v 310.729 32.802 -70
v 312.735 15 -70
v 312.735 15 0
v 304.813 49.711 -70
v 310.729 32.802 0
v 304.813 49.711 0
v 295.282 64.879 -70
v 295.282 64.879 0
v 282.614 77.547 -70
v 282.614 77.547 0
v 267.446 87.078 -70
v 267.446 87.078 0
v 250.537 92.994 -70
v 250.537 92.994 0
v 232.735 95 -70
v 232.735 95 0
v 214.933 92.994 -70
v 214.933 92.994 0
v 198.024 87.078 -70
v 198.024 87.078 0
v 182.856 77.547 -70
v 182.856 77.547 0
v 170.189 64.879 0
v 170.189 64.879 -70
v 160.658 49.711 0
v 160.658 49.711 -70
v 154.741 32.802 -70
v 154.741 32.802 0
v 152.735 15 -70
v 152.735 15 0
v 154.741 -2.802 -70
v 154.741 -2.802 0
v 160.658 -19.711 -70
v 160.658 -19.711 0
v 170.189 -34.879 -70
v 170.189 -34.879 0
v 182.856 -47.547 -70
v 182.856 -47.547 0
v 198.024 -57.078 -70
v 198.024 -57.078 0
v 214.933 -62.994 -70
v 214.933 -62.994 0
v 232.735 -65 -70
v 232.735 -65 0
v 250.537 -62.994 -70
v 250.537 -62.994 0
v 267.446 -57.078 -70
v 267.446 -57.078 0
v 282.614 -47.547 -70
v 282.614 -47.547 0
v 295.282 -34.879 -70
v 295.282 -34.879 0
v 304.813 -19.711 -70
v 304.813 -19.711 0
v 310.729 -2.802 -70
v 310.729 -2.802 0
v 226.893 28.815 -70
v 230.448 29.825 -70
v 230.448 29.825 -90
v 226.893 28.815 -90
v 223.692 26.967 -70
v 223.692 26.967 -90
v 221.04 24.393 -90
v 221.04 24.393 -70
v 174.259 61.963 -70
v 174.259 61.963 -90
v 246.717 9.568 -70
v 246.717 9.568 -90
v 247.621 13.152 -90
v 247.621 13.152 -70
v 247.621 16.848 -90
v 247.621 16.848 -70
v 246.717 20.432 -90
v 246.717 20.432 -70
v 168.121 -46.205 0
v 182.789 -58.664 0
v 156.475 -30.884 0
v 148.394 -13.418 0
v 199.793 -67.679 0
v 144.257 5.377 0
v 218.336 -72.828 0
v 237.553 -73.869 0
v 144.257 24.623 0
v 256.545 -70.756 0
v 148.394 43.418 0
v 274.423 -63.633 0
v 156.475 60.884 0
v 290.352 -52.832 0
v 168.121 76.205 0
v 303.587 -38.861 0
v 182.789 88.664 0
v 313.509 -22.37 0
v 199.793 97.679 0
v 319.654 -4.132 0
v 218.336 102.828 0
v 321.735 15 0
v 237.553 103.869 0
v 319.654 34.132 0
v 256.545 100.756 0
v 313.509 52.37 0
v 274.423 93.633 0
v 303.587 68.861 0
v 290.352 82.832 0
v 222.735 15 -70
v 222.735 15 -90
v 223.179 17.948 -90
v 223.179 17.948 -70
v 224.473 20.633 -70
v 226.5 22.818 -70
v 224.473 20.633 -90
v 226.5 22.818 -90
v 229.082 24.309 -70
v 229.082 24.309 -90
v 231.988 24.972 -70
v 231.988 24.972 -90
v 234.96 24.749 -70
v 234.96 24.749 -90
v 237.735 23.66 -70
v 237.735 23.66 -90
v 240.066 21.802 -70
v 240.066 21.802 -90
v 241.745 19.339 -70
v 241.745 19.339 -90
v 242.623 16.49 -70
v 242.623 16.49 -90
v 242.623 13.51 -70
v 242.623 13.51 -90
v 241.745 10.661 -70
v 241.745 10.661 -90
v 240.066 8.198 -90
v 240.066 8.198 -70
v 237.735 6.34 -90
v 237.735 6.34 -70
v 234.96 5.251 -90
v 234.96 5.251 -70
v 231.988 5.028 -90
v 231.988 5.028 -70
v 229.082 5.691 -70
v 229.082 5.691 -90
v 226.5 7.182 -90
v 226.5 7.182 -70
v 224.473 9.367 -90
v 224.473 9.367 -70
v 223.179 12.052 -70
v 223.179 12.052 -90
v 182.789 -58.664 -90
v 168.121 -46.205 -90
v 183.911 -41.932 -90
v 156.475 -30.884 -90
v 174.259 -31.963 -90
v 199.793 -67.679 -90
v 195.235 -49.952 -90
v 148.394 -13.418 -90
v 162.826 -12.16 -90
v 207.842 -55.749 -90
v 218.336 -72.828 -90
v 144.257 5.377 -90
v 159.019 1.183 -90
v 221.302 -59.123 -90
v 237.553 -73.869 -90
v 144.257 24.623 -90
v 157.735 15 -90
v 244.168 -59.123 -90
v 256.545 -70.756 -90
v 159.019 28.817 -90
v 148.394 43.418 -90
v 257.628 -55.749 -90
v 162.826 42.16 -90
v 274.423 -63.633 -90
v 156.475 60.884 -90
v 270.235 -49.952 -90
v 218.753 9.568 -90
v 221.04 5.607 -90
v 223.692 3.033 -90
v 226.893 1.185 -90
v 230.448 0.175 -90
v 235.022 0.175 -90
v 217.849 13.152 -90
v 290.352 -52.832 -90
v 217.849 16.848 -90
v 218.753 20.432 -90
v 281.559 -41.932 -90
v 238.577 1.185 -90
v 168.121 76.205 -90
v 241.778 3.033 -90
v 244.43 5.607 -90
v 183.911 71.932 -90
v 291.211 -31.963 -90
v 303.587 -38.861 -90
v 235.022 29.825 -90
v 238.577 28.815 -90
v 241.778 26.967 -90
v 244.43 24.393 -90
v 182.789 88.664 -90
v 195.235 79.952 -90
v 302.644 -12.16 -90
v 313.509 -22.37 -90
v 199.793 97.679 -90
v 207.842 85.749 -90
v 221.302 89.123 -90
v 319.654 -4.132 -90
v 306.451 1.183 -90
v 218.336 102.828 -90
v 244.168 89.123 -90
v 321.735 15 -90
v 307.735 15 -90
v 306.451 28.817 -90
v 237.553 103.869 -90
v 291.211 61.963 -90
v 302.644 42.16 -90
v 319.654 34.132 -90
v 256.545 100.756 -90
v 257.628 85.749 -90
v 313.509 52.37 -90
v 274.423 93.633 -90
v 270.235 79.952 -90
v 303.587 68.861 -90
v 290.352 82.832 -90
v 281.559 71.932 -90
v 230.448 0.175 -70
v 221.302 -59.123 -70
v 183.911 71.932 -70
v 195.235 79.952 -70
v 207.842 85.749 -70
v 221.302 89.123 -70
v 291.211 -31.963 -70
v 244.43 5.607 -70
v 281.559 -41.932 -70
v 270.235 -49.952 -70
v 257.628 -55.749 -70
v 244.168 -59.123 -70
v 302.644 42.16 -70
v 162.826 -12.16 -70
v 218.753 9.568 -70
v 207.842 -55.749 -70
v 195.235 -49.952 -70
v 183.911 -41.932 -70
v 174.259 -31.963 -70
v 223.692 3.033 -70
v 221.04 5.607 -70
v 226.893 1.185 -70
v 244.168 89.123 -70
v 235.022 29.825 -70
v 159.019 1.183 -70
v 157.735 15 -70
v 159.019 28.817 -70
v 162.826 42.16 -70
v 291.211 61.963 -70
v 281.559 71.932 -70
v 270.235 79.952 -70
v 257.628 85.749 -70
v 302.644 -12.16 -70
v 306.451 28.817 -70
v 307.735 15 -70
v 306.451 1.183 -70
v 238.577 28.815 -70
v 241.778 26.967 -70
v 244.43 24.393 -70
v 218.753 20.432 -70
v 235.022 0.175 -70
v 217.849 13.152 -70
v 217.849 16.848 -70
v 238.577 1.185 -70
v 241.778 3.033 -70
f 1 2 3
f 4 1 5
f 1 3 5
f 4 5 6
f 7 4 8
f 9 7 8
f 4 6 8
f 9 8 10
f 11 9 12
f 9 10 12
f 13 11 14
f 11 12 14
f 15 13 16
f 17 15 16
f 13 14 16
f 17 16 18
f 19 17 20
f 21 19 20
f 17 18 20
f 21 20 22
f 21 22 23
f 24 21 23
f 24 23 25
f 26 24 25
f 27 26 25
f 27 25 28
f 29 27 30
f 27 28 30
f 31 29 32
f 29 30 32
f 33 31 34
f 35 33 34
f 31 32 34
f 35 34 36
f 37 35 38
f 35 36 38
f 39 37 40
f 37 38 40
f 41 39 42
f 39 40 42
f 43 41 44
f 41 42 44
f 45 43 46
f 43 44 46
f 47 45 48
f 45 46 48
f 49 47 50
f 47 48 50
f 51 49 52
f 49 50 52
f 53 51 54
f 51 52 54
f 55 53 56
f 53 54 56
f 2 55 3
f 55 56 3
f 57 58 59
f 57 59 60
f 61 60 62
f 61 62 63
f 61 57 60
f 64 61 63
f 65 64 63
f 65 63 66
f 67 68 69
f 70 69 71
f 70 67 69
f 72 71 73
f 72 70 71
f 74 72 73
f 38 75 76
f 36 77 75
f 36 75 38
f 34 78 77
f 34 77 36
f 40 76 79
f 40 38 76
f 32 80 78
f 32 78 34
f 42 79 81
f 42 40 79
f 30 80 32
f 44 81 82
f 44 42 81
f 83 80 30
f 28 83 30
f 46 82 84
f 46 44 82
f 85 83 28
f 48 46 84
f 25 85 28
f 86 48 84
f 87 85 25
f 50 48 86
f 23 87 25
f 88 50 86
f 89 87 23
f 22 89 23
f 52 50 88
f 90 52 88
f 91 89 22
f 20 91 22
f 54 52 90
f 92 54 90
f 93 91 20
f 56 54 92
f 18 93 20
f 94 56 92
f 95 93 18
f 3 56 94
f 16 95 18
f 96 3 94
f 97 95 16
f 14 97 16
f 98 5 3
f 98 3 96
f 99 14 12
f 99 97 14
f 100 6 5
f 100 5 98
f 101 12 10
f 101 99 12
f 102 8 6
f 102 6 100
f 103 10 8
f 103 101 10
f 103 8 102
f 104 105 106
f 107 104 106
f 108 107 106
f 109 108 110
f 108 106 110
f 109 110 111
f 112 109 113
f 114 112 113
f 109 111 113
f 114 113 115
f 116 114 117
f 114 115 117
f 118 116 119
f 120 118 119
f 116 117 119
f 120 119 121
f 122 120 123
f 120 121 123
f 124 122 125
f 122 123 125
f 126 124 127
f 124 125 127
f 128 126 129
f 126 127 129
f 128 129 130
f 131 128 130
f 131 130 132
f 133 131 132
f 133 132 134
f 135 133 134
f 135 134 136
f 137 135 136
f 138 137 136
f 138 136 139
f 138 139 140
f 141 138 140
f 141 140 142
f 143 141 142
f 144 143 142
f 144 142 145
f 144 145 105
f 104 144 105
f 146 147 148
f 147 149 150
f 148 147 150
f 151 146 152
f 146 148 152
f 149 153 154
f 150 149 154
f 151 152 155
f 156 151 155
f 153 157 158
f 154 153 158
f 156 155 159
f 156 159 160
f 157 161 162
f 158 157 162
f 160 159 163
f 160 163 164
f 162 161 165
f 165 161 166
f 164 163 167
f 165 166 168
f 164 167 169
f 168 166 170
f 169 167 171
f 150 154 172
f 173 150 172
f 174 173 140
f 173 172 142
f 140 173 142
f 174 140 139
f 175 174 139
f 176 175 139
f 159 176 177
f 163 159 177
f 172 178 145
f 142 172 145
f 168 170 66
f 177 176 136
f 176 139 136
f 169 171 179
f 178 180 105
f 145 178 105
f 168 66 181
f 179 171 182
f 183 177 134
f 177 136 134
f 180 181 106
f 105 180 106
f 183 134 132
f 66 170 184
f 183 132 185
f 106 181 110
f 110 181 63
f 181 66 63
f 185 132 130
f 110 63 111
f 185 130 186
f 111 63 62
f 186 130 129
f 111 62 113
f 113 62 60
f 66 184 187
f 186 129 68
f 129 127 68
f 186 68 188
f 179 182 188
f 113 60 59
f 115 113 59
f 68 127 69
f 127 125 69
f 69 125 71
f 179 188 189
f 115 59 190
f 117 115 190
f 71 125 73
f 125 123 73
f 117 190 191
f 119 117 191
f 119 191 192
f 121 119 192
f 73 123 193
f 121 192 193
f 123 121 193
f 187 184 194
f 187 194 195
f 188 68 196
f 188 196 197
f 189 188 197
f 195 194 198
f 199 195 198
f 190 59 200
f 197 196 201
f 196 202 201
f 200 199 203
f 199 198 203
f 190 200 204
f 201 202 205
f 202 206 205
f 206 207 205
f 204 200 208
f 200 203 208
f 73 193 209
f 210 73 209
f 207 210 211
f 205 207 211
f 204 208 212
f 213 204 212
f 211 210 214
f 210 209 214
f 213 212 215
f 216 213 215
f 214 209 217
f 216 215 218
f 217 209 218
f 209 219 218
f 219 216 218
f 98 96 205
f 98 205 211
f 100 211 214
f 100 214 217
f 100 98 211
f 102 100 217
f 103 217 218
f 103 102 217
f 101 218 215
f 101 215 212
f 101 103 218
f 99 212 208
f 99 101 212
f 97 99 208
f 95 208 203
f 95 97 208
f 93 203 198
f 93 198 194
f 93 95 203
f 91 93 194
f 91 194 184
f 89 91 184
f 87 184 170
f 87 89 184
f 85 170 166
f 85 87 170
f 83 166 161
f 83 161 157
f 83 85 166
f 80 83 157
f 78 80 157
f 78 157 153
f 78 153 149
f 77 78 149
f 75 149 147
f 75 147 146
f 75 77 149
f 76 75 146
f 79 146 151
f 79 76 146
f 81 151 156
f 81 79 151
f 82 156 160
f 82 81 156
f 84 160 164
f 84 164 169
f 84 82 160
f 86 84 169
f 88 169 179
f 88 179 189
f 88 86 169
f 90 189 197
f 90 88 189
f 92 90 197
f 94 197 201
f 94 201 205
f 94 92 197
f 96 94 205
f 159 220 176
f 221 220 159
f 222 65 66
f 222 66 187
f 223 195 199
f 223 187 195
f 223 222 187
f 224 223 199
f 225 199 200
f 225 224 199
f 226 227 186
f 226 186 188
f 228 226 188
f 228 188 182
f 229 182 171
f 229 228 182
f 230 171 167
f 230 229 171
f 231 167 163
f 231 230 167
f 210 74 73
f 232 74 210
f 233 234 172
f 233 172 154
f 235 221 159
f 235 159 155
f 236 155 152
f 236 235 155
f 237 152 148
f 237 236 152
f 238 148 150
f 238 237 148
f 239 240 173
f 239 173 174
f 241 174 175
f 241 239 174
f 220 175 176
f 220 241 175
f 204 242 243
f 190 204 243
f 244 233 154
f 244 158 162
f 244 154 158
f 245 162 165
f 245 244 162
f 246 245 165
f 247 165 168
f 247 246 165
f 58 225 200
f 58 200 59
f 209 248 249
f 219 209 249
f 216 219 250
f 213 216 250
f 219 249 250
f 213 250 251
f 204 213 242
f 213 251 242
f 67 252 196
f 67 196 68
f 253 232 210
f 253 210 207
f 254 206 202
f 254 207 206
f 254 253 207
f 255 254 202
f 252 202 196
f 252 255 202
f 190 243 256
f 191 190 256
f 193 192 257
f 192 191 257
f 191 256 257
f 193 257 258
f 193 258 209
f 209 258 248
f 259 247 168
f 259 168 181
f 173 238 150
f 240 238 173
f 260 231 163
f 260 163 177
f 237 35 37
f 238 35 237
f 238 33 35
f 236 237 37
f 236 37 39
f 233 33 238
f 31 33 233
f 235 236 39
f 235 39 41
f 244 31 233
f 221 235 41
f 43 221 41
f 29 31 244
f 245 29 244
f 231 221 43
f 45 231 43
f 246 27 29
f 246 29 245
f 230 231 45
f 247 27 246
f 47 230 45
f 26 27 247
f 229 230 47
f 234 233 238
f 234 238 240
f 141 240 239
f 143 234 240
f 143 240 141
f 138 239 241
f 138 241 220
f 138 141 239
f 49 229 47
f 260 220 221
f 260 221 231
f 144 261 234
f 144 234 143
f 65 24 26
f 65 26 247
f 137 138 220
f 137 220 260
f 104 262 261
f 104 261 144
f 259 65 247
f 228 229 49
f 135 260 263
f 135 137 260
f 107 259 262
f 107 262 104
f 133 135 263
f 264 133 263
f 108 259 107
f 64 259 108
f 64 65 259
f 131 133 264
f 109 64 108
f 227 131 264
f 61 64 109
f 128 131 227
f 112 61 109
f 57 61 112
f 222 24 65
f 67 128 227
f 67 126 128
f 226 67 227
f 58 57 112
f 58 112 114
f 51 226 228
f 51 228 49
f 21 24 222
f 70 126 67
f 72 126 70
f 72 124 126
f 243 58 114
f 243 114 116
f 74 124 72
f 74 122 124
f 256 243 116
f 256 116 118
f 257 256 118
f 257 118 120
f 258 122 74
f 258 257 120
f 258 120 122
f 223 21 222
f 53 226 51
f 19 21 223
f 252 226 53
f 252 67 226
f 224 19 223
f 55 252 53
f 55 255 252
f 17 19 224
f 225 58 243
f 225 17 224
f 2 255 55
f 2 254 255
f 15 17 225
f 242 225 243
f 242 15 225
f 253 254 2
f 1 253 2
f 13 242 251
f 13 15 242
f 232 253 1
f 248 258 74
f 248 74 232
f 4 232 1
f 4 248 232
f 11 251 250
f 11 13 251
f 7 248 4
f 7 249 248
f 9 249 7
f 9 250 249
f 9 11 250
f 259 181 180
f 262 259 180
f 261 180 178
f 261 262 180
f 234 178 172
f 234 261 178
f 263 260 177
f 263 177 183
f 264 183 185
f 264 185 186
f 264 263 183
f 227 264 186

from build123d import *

# Parameters (mm, degrees)
SKETCH1_R           = 89
BOSS_EXTRUDE1_DEPTH = 90
CUT_EXTRUDE1_DEPTH  = 91
SKETCH3_R           = 80
CUT_EXTRUDE2_DEPTH  = 70
SKETCH4_R           = 10
CUT_EXTRUDE3_DEPTH  = 91


with BuildPart() as part:
    # Sketch1 → Boss-Extrude1 (new body)
    with BuildSketch(Plane.XY):
        with Locations((232.735026919, 15)):
            Circle(SKETCH1_R)
    extrude(amount=-BOSS_EXTRUDE1_DEPTH)

    # Sketch2 → Cut-Extrude1 (cut, through all)
    with BuildSketch(Plane.XY):
        with BuildLine():
            Line((221.301935747, 89.123440464), (230.448408684, 29.824688093))
            ThreePointArc((230.448408684, 29.824688093), (225.235026919, 27.990381057), (221.039779545, 24.392613526))
            Line((221.039779545, 24.392613526), (174.258790047, 61.963067631))
            ThreePointArc((174.258790047, 61.963067631), (195.235026919, 79.951905284), (221.301935747, 89.123440464))
        make_face()
        with BuildLine():
            Line((244.168118091, 89.123440464), (235.021645153, 29.824688093))
            ThreePointArc((235.021645153, 29.824688093), (240.235026919, 27.990381057), (244.430274293, 24.392613526))
            Line((244.430274293, 24.392613526), (291.211263791, 61.963067631))
            ThreePointArc((291.211263791, 61.963067631), (270.235026919, 79.951905284), (244.168118091, 89.123440464))
        make_face()
        with BuildLine():
            Line((162.825698875, 42.160372833), (218.75316131, 20.432074567))
            ThreePointArc((218.75316131, 20.432074567), (217.735026919, 15), (218.75316131, 9.567925433))
            Line((218.75316131, 9.567925433), (162.825698875, -12.160372833))
            ThreePointArc((162.825698875, -12.160372833), (157.735026919, 15), (162.825698875, 42.160372833))
        make_face()
        with BuildLine():
            Line((174.258790047, -31.963067631), (221.039779545, 5.607386474))
            ThreePointArc((221.039779545, 5.607386474), (225.235026919, 2.009618943), (230.448408684, 0.175311907))
            Line((230.448408684, 0.175311907), (221.301935747, -59.123440464))
            ThreePointArc((221.301935747, -59.123440464), (195.235026919, -49.951905284), (174.258790047, -31.963067631))
        make_face()
        with BuildLine():
            Line((244.168118091, -59.123440464), (235.021645153, 0.175311907))
            ThreePointArc((235.021645153, 0.175311907), (240.235026919, 2.009618943), (244.430274293, 5.607386474))
            Line((244.430274293, 5.607386474), (291.211263791, -31.963067631))
            ThreePointArc((291.211263791, -31.963067631), (270.235026919, -49.951905284), (244.168118091, -59.123440464))
        make_face()
        with BuildLine():
            Line((302.644354963, -12.160372833), (246.716892528, 9.567925433))
            ThreePointArc((246.716892528, 9.567925433), (247.735026919, 15), (246.716892528, 20.432074567))
            Line((246.716892528, 20.432074567), (302.644354963, 42.160372833))
            ThreePointArc((302.644354963, 42.160372833), (307.735026919, 15), (302.644354963, -12.160372833))
        make_face()
    extrude(amount=-CUT_EXTRUDE1_DEPTH, mode=Mode.SUBTRACT)

    # Sketch3 → Cut-Extrude2 (cut)
    with BuildSketch(Plane.XY):
        with Locations((232.735026919, 15)):
            Circle(SKETCH3_R)
    extrude(amount=-CUT_EXTRUDE2_DEPTH, mode=Mode.SUBTRACT)

    # Sketch4 → Cut-Extrude3 (cut, through all)
    with BuildSketch(Plane(origin=(0, 0, -90), x_dir=(-1, 0, 0), z_dir=(0, 0, -1))):
        with Locations((-232.735026919, 15)):
            Circle(SKETCH4_R)
    extrude(amount=-CUT_EXTRUDE3_DEPTH, mode=Mode.SUBTRACT)


solid = part.part
